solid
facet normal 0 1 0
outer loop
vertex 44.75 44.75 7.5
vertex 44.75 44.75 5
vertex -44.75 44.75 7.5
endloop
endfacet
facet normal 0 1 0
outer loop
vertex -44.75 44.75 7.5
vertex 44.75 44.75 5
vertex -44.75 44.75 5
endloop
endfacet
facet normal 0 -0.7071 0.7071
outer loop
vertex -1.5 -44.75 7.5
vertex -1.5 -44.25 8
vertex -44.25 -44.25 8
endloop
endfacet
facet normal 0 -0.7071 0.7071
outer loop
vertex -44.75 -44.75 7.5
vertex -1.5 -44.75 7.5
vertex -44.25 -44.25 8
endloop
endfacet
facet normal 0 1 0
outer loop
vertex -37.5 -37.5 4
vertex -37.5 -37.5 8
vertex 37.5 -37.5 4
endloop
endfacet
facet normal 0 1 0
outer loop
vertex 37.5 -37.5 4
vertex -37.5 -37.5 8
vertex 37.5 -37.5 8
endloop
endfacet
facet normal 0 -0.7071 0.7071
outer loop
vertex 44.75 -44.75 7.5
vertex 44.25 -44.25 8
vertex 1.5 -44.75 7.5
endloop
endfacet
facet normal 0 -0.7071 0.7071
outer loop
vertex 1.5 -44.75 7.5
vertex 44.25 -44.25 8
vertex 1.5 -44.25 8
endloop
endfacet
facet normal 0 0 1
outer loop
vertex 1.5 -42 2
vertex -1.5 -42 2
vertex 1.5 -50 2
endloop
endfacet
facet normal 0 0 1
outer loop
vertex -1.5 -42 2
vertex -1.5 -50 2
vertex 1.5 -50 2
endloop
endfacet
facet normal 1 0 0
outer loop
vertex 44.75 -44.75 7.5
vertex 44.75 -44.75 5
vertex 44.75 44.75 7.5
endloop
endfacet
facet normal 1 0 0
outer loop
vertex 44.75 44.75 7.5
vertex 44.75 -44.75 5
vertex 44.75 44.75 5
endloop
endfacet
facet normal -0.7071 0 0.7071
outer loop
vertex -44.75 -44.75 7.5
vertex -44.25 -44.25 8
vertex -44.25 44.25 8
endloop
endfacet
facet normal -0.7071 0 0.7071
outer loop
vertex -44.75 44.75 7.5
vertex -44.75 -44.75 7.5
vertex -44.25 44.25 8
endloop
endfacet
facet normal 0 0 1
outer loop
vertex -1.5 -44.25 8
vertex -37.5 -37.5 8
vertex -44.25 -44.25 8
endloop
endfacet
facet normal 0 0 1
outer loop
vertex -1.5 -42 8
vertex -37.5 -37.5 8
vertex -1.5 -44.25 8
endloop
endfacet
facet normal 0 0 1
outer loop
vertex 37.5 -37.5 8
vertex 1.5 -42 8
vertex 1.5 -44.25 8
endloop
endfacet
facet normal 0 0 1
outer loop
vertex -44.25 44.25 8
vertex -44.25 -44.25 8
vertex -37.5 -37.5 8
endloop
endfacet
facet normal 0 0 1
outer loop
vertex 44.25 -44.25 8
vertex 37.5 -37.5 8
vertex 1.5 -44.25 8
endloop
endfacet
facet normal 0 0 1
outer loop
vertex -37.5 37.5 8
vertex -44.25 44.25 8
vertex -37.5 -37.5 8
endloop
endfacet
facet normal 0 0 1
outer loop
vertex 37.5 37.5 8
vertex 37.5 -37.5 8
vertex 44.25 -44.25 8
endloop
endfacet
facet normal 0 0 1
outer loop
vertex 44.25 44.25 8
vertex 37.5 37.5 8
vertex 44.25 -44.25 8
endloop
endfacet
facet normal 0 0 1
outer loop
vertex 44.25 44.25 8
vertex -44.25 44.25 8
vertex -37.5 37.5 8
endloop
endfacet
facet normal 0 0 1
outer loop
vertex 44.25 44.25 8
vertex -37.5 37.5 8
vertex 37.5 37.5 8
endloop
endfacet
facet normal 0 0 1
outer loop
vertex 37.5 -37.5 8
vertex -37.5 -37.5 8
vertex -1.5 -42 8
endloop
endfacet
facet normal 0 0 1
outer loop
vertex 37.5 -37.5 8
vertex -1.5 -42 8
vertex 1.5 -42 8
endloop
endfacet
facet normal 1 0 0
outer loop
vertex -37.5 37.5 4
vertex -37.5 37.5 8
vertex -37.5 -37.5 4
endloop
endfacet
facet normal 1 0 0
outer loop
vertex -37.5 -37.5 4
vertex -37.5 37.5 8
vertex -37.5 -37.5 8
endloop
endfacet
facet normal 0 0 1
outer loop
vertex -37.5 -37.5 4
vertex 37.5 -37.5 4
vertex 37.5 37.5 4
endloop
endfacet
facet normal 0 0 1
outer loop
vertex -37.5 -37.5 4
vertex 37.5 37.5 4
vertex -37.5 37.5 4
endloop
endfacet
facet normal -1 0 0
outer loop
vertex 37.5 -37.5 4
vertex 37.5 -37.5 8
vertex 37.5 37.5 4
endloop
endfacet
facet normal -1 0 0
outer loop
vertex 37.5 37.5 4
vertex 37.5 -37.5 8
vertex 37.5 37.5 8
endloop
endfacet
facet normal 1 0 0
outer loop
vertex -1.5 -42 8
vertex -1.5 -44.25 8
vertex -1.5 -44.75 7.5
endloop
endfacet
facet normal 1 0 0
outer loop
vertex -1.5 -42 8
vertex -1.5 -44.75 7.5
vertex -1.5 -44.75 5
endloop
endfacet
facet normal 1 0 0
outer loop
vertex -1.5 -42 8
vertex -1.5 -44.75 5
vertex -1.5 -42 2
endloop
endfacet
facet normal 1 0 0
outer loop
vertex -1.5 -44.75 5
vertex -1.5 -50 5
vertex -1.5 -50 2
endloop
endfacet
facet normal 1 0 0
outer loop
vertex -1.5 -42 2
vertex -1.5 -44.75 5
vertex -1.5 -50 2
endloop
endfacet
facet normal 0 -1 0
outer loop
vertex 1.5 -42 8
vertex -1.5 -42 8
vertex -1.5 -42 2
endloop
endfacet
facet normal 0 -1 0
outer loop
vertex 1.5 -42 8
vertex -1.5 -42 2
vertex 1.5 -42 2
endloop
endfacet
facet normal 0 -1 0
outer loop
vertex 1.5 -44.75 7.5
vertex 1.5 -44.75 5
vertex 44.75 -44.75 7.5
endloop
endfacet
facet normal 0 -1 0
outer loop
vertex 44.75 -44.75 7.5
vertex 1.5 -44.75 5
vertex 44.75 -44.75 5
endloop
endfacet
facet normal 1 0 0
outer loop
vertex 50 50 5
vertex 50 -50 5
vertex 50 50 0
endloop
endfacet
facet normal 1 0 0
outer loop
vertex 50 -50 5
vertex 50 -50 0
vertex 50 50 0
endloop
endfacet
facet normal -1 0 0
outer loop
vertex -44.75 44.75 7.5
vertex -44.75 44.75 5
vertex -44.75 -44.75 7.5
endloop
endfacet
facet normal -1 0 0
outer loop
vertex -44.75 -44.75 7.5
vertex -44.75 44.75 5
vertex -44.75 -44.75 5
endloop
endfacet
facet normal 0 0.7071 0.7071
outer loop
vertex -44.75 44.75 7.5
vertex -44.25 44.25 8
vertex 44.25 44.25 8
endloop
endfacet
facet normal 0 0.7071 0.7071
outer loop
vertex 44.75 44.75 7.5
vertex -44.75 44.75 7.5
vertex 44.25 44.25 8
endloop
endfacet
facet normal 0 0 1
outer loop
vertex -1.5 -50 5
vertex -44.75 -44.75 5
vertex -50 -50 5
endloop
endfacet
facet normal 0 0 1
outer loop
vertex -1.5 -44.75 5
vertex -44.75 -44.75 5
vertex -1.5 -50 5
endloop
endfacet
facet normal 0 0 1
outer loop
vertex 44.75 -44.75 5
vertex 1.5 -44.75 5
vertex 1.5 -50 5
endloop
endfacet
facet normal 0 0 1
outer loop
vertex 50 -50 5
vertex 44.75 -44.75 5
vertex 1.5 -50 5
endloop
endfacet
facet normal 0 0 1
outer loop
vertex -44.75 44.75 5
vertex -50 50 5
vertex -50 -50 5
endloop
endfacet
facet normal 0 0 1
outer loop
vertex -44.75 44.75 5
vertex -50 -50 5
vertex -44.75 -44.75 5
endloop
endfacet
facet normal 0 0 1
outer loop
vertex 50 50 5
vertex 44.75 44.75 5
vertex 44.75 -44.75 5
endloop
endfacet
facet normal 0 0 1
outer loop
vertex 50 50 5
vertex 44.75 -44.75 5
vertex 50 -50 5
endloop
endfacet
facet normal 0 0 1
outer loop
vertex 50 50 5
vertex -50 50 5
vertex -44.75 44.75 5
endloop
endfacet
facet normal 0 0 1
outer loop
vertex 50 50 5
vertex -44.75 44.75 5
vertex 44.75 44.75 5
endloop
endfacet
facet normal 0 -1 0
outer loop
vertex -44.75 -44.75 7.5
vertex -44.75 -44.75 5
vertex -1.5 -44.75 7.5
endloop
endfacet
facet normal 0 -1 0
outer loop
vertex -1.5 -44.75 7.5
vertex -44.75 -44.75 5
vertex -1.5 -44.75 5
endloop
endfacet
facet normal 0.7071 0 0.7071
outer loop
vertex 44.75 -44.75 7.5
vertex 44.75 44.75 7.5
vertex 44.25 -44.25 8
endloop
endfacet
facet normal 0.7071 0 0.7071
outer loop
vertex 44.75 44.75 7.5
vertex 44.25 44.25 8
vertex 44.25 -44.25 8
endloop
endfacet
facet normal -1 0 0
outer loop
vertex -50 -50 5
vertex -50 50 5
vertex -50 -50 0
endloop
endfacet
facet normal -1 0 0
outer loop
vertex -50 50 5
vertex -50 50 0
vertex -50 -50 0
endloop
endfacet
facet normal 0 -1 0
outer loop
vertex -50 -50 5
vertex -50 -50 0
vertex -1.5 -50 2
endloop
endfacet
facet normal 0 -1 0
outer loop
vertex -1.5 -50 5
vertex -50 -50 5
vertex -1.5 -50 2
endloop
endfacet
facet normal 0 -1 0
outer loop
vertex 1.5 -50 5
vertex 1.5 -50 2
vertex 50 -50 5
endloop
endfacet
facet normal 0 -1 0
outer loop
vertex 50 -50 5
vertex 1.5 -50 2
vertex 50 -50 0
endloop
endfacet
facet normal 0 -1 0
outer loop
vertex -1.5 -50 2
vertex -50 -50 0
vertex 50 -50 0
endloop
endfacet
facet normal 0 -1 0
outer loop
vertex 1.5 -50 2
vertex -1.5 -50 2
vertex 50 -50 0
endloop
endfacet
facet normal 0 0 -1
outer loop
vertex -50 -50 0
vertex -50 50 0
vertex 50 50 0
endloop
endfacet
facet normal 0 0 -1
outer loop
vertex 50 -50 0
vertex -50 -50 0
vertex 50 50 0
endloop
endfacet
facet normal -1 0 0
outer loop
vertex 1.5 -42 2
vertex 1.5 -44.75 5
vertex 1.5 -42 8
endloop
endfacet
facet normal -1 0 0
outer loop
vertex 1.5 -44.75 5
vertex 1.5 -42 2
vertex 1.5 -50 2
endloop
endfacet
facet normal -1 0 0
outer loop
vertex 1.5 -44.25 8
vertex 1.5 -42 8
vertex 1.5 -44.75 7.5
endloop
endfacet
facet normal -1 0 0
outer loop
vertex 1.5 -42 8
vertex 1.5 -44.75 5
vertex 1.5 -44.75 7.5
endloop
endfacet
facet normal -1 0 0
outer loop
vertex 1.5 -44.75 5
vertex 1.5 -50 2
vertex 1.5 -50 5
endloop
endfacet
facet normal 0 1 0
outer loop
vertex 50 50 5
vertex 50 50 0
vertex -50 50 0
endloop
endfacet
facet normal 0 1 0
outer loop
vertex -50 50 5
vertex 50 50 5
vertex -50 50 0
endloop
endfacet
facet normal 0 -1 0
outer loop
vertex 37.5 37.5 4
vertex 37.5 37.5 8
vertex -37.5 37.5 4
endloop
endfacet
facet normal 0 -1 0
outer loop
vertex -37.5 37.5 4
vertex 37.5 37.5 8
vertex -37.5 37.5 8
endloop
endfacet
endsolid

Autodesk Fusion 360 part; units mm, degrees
sketch "Sketch1" plane through (0, 0, 0) normal (0, 0, 1) x (1, 0, 0)
  line L0 (50, 50) -> (-50, 50)
  line L1 (-50, 50) -> (-50, -50)
  line L2 (-50, -50) -> (50, -50)
  line L3 (50, -50) -> (50, 50)
  line L4 (50, 50) -> (-50, -50) construction
  line L5 (-50, 50) -> (50, -50) construction
  line L6 (44.75, 44.75) -> (-44.75, 44.75)
  line L7 (-44.75, 44.75) -> (-44.75, -44.75)
  line L8 (-44.75, -44.75) -> (44.75, -44.75)
  line L9 (44.75, -44.75) -> (44.75, 44.75)
  line L10 (44.75, 44.75) -> (-44.75, -44.75) construction
  line L11 (-44.75, 44.75) -> (44.75, -44.75) construction
  dimension "d1" = 89.5
  dimension "d12" = 89.5
extrude "Extrude1" add sketch "Sketch1" along normal blind 5
extrude "Extrude2" add sketch "Sketch1" along normal blind 8 contours L6 L7 L8 L9
sketch "Sketch2" plane through (0, -50, 0) normal (0, -1, 0) x (1, 0, 0)
  line L0 (-50, 0) -> (50, 0)
  line L1 (50, 0) -> (50, 5)
  line L2 (50, 5) -> (-50, 5)
  line L3 (-50, 5) -> (-50, 0)
  line L4 (1.5, 8) -> (-1.5, 8)
  line L5 (-1.5, 8) -> (-1.5, 2)
  line L6 (-1.5, 2) -> (1.5, 2)
  line L7 (1.5, 2) -> (1.5, 8)
  line L8 (1.5, 8) -> (-1.5, 2) construction
  line L9 (-1.5, 8) -> (1.5, 2) construction
  point P0 (0, 5)
  dimension "d6" = 6
  dimension "d7" = 3
extrude "Extrude3" cut sketch "Sketch2" against normal blind 8 contours L2 L4 L5 L7 | L2 L5 L6 L7
chamfer "Chamfer1" distance 0.5 angle 45 4 edges at (-23.125, -44.75, 8) (-44.75, 0, 8) (23.125, -44.75, 8) (44.75, 0, 8)
chamfer "Chamfer1" distance 0.5 angle 45 1 edges at (0, 44.75, 8)
sketch "Sketch3" plane through (0, 0, 8) normal (0, 0, 1) x (-1, 0, 0)
  line L0 (44.25, 44.25) -> (1.5, 44.25)
  line L1 (1.5, 44.25) -> (1.5, 42)
  line L2 (1.5, 42) -> (-1.5, 42)
  line L3 (-1.5, 42) -> (-1.5, 44.25)
  line L4 (-1.5, 44.25) -> (-44.25, 44.25)
  line L5 (-44.25, 44.25) -> (-44.25, -44.25)
  line L6 (-44.25, -44.25) -> (44.25, -44.25)
  line L7 (44.25, -44.25) -> (44.25, 44.25)
  line L8 (-37.5, -37.5) -> (37.5, -37.5)
  line L9 (37.5, -37.5) -> (37.5, 37.5)
  line L10 (37.5, 37.5) -> (-37.5, 37.5)
  line L11 (-37.5, 37.5) -> (-37.5, -37.5)
  line L12 (-37.5, -37.5) -> (37.5, 37.5) construction
  line L13 (37.5, -37.5) -> (-37.5, 37.5) construction
  dimension "d13" = 75
  dimension "d14" = 75
extrude "Extrude4" cut sketch "Sketch3" against normal blind 4 contours L8 L9 L10 L11
